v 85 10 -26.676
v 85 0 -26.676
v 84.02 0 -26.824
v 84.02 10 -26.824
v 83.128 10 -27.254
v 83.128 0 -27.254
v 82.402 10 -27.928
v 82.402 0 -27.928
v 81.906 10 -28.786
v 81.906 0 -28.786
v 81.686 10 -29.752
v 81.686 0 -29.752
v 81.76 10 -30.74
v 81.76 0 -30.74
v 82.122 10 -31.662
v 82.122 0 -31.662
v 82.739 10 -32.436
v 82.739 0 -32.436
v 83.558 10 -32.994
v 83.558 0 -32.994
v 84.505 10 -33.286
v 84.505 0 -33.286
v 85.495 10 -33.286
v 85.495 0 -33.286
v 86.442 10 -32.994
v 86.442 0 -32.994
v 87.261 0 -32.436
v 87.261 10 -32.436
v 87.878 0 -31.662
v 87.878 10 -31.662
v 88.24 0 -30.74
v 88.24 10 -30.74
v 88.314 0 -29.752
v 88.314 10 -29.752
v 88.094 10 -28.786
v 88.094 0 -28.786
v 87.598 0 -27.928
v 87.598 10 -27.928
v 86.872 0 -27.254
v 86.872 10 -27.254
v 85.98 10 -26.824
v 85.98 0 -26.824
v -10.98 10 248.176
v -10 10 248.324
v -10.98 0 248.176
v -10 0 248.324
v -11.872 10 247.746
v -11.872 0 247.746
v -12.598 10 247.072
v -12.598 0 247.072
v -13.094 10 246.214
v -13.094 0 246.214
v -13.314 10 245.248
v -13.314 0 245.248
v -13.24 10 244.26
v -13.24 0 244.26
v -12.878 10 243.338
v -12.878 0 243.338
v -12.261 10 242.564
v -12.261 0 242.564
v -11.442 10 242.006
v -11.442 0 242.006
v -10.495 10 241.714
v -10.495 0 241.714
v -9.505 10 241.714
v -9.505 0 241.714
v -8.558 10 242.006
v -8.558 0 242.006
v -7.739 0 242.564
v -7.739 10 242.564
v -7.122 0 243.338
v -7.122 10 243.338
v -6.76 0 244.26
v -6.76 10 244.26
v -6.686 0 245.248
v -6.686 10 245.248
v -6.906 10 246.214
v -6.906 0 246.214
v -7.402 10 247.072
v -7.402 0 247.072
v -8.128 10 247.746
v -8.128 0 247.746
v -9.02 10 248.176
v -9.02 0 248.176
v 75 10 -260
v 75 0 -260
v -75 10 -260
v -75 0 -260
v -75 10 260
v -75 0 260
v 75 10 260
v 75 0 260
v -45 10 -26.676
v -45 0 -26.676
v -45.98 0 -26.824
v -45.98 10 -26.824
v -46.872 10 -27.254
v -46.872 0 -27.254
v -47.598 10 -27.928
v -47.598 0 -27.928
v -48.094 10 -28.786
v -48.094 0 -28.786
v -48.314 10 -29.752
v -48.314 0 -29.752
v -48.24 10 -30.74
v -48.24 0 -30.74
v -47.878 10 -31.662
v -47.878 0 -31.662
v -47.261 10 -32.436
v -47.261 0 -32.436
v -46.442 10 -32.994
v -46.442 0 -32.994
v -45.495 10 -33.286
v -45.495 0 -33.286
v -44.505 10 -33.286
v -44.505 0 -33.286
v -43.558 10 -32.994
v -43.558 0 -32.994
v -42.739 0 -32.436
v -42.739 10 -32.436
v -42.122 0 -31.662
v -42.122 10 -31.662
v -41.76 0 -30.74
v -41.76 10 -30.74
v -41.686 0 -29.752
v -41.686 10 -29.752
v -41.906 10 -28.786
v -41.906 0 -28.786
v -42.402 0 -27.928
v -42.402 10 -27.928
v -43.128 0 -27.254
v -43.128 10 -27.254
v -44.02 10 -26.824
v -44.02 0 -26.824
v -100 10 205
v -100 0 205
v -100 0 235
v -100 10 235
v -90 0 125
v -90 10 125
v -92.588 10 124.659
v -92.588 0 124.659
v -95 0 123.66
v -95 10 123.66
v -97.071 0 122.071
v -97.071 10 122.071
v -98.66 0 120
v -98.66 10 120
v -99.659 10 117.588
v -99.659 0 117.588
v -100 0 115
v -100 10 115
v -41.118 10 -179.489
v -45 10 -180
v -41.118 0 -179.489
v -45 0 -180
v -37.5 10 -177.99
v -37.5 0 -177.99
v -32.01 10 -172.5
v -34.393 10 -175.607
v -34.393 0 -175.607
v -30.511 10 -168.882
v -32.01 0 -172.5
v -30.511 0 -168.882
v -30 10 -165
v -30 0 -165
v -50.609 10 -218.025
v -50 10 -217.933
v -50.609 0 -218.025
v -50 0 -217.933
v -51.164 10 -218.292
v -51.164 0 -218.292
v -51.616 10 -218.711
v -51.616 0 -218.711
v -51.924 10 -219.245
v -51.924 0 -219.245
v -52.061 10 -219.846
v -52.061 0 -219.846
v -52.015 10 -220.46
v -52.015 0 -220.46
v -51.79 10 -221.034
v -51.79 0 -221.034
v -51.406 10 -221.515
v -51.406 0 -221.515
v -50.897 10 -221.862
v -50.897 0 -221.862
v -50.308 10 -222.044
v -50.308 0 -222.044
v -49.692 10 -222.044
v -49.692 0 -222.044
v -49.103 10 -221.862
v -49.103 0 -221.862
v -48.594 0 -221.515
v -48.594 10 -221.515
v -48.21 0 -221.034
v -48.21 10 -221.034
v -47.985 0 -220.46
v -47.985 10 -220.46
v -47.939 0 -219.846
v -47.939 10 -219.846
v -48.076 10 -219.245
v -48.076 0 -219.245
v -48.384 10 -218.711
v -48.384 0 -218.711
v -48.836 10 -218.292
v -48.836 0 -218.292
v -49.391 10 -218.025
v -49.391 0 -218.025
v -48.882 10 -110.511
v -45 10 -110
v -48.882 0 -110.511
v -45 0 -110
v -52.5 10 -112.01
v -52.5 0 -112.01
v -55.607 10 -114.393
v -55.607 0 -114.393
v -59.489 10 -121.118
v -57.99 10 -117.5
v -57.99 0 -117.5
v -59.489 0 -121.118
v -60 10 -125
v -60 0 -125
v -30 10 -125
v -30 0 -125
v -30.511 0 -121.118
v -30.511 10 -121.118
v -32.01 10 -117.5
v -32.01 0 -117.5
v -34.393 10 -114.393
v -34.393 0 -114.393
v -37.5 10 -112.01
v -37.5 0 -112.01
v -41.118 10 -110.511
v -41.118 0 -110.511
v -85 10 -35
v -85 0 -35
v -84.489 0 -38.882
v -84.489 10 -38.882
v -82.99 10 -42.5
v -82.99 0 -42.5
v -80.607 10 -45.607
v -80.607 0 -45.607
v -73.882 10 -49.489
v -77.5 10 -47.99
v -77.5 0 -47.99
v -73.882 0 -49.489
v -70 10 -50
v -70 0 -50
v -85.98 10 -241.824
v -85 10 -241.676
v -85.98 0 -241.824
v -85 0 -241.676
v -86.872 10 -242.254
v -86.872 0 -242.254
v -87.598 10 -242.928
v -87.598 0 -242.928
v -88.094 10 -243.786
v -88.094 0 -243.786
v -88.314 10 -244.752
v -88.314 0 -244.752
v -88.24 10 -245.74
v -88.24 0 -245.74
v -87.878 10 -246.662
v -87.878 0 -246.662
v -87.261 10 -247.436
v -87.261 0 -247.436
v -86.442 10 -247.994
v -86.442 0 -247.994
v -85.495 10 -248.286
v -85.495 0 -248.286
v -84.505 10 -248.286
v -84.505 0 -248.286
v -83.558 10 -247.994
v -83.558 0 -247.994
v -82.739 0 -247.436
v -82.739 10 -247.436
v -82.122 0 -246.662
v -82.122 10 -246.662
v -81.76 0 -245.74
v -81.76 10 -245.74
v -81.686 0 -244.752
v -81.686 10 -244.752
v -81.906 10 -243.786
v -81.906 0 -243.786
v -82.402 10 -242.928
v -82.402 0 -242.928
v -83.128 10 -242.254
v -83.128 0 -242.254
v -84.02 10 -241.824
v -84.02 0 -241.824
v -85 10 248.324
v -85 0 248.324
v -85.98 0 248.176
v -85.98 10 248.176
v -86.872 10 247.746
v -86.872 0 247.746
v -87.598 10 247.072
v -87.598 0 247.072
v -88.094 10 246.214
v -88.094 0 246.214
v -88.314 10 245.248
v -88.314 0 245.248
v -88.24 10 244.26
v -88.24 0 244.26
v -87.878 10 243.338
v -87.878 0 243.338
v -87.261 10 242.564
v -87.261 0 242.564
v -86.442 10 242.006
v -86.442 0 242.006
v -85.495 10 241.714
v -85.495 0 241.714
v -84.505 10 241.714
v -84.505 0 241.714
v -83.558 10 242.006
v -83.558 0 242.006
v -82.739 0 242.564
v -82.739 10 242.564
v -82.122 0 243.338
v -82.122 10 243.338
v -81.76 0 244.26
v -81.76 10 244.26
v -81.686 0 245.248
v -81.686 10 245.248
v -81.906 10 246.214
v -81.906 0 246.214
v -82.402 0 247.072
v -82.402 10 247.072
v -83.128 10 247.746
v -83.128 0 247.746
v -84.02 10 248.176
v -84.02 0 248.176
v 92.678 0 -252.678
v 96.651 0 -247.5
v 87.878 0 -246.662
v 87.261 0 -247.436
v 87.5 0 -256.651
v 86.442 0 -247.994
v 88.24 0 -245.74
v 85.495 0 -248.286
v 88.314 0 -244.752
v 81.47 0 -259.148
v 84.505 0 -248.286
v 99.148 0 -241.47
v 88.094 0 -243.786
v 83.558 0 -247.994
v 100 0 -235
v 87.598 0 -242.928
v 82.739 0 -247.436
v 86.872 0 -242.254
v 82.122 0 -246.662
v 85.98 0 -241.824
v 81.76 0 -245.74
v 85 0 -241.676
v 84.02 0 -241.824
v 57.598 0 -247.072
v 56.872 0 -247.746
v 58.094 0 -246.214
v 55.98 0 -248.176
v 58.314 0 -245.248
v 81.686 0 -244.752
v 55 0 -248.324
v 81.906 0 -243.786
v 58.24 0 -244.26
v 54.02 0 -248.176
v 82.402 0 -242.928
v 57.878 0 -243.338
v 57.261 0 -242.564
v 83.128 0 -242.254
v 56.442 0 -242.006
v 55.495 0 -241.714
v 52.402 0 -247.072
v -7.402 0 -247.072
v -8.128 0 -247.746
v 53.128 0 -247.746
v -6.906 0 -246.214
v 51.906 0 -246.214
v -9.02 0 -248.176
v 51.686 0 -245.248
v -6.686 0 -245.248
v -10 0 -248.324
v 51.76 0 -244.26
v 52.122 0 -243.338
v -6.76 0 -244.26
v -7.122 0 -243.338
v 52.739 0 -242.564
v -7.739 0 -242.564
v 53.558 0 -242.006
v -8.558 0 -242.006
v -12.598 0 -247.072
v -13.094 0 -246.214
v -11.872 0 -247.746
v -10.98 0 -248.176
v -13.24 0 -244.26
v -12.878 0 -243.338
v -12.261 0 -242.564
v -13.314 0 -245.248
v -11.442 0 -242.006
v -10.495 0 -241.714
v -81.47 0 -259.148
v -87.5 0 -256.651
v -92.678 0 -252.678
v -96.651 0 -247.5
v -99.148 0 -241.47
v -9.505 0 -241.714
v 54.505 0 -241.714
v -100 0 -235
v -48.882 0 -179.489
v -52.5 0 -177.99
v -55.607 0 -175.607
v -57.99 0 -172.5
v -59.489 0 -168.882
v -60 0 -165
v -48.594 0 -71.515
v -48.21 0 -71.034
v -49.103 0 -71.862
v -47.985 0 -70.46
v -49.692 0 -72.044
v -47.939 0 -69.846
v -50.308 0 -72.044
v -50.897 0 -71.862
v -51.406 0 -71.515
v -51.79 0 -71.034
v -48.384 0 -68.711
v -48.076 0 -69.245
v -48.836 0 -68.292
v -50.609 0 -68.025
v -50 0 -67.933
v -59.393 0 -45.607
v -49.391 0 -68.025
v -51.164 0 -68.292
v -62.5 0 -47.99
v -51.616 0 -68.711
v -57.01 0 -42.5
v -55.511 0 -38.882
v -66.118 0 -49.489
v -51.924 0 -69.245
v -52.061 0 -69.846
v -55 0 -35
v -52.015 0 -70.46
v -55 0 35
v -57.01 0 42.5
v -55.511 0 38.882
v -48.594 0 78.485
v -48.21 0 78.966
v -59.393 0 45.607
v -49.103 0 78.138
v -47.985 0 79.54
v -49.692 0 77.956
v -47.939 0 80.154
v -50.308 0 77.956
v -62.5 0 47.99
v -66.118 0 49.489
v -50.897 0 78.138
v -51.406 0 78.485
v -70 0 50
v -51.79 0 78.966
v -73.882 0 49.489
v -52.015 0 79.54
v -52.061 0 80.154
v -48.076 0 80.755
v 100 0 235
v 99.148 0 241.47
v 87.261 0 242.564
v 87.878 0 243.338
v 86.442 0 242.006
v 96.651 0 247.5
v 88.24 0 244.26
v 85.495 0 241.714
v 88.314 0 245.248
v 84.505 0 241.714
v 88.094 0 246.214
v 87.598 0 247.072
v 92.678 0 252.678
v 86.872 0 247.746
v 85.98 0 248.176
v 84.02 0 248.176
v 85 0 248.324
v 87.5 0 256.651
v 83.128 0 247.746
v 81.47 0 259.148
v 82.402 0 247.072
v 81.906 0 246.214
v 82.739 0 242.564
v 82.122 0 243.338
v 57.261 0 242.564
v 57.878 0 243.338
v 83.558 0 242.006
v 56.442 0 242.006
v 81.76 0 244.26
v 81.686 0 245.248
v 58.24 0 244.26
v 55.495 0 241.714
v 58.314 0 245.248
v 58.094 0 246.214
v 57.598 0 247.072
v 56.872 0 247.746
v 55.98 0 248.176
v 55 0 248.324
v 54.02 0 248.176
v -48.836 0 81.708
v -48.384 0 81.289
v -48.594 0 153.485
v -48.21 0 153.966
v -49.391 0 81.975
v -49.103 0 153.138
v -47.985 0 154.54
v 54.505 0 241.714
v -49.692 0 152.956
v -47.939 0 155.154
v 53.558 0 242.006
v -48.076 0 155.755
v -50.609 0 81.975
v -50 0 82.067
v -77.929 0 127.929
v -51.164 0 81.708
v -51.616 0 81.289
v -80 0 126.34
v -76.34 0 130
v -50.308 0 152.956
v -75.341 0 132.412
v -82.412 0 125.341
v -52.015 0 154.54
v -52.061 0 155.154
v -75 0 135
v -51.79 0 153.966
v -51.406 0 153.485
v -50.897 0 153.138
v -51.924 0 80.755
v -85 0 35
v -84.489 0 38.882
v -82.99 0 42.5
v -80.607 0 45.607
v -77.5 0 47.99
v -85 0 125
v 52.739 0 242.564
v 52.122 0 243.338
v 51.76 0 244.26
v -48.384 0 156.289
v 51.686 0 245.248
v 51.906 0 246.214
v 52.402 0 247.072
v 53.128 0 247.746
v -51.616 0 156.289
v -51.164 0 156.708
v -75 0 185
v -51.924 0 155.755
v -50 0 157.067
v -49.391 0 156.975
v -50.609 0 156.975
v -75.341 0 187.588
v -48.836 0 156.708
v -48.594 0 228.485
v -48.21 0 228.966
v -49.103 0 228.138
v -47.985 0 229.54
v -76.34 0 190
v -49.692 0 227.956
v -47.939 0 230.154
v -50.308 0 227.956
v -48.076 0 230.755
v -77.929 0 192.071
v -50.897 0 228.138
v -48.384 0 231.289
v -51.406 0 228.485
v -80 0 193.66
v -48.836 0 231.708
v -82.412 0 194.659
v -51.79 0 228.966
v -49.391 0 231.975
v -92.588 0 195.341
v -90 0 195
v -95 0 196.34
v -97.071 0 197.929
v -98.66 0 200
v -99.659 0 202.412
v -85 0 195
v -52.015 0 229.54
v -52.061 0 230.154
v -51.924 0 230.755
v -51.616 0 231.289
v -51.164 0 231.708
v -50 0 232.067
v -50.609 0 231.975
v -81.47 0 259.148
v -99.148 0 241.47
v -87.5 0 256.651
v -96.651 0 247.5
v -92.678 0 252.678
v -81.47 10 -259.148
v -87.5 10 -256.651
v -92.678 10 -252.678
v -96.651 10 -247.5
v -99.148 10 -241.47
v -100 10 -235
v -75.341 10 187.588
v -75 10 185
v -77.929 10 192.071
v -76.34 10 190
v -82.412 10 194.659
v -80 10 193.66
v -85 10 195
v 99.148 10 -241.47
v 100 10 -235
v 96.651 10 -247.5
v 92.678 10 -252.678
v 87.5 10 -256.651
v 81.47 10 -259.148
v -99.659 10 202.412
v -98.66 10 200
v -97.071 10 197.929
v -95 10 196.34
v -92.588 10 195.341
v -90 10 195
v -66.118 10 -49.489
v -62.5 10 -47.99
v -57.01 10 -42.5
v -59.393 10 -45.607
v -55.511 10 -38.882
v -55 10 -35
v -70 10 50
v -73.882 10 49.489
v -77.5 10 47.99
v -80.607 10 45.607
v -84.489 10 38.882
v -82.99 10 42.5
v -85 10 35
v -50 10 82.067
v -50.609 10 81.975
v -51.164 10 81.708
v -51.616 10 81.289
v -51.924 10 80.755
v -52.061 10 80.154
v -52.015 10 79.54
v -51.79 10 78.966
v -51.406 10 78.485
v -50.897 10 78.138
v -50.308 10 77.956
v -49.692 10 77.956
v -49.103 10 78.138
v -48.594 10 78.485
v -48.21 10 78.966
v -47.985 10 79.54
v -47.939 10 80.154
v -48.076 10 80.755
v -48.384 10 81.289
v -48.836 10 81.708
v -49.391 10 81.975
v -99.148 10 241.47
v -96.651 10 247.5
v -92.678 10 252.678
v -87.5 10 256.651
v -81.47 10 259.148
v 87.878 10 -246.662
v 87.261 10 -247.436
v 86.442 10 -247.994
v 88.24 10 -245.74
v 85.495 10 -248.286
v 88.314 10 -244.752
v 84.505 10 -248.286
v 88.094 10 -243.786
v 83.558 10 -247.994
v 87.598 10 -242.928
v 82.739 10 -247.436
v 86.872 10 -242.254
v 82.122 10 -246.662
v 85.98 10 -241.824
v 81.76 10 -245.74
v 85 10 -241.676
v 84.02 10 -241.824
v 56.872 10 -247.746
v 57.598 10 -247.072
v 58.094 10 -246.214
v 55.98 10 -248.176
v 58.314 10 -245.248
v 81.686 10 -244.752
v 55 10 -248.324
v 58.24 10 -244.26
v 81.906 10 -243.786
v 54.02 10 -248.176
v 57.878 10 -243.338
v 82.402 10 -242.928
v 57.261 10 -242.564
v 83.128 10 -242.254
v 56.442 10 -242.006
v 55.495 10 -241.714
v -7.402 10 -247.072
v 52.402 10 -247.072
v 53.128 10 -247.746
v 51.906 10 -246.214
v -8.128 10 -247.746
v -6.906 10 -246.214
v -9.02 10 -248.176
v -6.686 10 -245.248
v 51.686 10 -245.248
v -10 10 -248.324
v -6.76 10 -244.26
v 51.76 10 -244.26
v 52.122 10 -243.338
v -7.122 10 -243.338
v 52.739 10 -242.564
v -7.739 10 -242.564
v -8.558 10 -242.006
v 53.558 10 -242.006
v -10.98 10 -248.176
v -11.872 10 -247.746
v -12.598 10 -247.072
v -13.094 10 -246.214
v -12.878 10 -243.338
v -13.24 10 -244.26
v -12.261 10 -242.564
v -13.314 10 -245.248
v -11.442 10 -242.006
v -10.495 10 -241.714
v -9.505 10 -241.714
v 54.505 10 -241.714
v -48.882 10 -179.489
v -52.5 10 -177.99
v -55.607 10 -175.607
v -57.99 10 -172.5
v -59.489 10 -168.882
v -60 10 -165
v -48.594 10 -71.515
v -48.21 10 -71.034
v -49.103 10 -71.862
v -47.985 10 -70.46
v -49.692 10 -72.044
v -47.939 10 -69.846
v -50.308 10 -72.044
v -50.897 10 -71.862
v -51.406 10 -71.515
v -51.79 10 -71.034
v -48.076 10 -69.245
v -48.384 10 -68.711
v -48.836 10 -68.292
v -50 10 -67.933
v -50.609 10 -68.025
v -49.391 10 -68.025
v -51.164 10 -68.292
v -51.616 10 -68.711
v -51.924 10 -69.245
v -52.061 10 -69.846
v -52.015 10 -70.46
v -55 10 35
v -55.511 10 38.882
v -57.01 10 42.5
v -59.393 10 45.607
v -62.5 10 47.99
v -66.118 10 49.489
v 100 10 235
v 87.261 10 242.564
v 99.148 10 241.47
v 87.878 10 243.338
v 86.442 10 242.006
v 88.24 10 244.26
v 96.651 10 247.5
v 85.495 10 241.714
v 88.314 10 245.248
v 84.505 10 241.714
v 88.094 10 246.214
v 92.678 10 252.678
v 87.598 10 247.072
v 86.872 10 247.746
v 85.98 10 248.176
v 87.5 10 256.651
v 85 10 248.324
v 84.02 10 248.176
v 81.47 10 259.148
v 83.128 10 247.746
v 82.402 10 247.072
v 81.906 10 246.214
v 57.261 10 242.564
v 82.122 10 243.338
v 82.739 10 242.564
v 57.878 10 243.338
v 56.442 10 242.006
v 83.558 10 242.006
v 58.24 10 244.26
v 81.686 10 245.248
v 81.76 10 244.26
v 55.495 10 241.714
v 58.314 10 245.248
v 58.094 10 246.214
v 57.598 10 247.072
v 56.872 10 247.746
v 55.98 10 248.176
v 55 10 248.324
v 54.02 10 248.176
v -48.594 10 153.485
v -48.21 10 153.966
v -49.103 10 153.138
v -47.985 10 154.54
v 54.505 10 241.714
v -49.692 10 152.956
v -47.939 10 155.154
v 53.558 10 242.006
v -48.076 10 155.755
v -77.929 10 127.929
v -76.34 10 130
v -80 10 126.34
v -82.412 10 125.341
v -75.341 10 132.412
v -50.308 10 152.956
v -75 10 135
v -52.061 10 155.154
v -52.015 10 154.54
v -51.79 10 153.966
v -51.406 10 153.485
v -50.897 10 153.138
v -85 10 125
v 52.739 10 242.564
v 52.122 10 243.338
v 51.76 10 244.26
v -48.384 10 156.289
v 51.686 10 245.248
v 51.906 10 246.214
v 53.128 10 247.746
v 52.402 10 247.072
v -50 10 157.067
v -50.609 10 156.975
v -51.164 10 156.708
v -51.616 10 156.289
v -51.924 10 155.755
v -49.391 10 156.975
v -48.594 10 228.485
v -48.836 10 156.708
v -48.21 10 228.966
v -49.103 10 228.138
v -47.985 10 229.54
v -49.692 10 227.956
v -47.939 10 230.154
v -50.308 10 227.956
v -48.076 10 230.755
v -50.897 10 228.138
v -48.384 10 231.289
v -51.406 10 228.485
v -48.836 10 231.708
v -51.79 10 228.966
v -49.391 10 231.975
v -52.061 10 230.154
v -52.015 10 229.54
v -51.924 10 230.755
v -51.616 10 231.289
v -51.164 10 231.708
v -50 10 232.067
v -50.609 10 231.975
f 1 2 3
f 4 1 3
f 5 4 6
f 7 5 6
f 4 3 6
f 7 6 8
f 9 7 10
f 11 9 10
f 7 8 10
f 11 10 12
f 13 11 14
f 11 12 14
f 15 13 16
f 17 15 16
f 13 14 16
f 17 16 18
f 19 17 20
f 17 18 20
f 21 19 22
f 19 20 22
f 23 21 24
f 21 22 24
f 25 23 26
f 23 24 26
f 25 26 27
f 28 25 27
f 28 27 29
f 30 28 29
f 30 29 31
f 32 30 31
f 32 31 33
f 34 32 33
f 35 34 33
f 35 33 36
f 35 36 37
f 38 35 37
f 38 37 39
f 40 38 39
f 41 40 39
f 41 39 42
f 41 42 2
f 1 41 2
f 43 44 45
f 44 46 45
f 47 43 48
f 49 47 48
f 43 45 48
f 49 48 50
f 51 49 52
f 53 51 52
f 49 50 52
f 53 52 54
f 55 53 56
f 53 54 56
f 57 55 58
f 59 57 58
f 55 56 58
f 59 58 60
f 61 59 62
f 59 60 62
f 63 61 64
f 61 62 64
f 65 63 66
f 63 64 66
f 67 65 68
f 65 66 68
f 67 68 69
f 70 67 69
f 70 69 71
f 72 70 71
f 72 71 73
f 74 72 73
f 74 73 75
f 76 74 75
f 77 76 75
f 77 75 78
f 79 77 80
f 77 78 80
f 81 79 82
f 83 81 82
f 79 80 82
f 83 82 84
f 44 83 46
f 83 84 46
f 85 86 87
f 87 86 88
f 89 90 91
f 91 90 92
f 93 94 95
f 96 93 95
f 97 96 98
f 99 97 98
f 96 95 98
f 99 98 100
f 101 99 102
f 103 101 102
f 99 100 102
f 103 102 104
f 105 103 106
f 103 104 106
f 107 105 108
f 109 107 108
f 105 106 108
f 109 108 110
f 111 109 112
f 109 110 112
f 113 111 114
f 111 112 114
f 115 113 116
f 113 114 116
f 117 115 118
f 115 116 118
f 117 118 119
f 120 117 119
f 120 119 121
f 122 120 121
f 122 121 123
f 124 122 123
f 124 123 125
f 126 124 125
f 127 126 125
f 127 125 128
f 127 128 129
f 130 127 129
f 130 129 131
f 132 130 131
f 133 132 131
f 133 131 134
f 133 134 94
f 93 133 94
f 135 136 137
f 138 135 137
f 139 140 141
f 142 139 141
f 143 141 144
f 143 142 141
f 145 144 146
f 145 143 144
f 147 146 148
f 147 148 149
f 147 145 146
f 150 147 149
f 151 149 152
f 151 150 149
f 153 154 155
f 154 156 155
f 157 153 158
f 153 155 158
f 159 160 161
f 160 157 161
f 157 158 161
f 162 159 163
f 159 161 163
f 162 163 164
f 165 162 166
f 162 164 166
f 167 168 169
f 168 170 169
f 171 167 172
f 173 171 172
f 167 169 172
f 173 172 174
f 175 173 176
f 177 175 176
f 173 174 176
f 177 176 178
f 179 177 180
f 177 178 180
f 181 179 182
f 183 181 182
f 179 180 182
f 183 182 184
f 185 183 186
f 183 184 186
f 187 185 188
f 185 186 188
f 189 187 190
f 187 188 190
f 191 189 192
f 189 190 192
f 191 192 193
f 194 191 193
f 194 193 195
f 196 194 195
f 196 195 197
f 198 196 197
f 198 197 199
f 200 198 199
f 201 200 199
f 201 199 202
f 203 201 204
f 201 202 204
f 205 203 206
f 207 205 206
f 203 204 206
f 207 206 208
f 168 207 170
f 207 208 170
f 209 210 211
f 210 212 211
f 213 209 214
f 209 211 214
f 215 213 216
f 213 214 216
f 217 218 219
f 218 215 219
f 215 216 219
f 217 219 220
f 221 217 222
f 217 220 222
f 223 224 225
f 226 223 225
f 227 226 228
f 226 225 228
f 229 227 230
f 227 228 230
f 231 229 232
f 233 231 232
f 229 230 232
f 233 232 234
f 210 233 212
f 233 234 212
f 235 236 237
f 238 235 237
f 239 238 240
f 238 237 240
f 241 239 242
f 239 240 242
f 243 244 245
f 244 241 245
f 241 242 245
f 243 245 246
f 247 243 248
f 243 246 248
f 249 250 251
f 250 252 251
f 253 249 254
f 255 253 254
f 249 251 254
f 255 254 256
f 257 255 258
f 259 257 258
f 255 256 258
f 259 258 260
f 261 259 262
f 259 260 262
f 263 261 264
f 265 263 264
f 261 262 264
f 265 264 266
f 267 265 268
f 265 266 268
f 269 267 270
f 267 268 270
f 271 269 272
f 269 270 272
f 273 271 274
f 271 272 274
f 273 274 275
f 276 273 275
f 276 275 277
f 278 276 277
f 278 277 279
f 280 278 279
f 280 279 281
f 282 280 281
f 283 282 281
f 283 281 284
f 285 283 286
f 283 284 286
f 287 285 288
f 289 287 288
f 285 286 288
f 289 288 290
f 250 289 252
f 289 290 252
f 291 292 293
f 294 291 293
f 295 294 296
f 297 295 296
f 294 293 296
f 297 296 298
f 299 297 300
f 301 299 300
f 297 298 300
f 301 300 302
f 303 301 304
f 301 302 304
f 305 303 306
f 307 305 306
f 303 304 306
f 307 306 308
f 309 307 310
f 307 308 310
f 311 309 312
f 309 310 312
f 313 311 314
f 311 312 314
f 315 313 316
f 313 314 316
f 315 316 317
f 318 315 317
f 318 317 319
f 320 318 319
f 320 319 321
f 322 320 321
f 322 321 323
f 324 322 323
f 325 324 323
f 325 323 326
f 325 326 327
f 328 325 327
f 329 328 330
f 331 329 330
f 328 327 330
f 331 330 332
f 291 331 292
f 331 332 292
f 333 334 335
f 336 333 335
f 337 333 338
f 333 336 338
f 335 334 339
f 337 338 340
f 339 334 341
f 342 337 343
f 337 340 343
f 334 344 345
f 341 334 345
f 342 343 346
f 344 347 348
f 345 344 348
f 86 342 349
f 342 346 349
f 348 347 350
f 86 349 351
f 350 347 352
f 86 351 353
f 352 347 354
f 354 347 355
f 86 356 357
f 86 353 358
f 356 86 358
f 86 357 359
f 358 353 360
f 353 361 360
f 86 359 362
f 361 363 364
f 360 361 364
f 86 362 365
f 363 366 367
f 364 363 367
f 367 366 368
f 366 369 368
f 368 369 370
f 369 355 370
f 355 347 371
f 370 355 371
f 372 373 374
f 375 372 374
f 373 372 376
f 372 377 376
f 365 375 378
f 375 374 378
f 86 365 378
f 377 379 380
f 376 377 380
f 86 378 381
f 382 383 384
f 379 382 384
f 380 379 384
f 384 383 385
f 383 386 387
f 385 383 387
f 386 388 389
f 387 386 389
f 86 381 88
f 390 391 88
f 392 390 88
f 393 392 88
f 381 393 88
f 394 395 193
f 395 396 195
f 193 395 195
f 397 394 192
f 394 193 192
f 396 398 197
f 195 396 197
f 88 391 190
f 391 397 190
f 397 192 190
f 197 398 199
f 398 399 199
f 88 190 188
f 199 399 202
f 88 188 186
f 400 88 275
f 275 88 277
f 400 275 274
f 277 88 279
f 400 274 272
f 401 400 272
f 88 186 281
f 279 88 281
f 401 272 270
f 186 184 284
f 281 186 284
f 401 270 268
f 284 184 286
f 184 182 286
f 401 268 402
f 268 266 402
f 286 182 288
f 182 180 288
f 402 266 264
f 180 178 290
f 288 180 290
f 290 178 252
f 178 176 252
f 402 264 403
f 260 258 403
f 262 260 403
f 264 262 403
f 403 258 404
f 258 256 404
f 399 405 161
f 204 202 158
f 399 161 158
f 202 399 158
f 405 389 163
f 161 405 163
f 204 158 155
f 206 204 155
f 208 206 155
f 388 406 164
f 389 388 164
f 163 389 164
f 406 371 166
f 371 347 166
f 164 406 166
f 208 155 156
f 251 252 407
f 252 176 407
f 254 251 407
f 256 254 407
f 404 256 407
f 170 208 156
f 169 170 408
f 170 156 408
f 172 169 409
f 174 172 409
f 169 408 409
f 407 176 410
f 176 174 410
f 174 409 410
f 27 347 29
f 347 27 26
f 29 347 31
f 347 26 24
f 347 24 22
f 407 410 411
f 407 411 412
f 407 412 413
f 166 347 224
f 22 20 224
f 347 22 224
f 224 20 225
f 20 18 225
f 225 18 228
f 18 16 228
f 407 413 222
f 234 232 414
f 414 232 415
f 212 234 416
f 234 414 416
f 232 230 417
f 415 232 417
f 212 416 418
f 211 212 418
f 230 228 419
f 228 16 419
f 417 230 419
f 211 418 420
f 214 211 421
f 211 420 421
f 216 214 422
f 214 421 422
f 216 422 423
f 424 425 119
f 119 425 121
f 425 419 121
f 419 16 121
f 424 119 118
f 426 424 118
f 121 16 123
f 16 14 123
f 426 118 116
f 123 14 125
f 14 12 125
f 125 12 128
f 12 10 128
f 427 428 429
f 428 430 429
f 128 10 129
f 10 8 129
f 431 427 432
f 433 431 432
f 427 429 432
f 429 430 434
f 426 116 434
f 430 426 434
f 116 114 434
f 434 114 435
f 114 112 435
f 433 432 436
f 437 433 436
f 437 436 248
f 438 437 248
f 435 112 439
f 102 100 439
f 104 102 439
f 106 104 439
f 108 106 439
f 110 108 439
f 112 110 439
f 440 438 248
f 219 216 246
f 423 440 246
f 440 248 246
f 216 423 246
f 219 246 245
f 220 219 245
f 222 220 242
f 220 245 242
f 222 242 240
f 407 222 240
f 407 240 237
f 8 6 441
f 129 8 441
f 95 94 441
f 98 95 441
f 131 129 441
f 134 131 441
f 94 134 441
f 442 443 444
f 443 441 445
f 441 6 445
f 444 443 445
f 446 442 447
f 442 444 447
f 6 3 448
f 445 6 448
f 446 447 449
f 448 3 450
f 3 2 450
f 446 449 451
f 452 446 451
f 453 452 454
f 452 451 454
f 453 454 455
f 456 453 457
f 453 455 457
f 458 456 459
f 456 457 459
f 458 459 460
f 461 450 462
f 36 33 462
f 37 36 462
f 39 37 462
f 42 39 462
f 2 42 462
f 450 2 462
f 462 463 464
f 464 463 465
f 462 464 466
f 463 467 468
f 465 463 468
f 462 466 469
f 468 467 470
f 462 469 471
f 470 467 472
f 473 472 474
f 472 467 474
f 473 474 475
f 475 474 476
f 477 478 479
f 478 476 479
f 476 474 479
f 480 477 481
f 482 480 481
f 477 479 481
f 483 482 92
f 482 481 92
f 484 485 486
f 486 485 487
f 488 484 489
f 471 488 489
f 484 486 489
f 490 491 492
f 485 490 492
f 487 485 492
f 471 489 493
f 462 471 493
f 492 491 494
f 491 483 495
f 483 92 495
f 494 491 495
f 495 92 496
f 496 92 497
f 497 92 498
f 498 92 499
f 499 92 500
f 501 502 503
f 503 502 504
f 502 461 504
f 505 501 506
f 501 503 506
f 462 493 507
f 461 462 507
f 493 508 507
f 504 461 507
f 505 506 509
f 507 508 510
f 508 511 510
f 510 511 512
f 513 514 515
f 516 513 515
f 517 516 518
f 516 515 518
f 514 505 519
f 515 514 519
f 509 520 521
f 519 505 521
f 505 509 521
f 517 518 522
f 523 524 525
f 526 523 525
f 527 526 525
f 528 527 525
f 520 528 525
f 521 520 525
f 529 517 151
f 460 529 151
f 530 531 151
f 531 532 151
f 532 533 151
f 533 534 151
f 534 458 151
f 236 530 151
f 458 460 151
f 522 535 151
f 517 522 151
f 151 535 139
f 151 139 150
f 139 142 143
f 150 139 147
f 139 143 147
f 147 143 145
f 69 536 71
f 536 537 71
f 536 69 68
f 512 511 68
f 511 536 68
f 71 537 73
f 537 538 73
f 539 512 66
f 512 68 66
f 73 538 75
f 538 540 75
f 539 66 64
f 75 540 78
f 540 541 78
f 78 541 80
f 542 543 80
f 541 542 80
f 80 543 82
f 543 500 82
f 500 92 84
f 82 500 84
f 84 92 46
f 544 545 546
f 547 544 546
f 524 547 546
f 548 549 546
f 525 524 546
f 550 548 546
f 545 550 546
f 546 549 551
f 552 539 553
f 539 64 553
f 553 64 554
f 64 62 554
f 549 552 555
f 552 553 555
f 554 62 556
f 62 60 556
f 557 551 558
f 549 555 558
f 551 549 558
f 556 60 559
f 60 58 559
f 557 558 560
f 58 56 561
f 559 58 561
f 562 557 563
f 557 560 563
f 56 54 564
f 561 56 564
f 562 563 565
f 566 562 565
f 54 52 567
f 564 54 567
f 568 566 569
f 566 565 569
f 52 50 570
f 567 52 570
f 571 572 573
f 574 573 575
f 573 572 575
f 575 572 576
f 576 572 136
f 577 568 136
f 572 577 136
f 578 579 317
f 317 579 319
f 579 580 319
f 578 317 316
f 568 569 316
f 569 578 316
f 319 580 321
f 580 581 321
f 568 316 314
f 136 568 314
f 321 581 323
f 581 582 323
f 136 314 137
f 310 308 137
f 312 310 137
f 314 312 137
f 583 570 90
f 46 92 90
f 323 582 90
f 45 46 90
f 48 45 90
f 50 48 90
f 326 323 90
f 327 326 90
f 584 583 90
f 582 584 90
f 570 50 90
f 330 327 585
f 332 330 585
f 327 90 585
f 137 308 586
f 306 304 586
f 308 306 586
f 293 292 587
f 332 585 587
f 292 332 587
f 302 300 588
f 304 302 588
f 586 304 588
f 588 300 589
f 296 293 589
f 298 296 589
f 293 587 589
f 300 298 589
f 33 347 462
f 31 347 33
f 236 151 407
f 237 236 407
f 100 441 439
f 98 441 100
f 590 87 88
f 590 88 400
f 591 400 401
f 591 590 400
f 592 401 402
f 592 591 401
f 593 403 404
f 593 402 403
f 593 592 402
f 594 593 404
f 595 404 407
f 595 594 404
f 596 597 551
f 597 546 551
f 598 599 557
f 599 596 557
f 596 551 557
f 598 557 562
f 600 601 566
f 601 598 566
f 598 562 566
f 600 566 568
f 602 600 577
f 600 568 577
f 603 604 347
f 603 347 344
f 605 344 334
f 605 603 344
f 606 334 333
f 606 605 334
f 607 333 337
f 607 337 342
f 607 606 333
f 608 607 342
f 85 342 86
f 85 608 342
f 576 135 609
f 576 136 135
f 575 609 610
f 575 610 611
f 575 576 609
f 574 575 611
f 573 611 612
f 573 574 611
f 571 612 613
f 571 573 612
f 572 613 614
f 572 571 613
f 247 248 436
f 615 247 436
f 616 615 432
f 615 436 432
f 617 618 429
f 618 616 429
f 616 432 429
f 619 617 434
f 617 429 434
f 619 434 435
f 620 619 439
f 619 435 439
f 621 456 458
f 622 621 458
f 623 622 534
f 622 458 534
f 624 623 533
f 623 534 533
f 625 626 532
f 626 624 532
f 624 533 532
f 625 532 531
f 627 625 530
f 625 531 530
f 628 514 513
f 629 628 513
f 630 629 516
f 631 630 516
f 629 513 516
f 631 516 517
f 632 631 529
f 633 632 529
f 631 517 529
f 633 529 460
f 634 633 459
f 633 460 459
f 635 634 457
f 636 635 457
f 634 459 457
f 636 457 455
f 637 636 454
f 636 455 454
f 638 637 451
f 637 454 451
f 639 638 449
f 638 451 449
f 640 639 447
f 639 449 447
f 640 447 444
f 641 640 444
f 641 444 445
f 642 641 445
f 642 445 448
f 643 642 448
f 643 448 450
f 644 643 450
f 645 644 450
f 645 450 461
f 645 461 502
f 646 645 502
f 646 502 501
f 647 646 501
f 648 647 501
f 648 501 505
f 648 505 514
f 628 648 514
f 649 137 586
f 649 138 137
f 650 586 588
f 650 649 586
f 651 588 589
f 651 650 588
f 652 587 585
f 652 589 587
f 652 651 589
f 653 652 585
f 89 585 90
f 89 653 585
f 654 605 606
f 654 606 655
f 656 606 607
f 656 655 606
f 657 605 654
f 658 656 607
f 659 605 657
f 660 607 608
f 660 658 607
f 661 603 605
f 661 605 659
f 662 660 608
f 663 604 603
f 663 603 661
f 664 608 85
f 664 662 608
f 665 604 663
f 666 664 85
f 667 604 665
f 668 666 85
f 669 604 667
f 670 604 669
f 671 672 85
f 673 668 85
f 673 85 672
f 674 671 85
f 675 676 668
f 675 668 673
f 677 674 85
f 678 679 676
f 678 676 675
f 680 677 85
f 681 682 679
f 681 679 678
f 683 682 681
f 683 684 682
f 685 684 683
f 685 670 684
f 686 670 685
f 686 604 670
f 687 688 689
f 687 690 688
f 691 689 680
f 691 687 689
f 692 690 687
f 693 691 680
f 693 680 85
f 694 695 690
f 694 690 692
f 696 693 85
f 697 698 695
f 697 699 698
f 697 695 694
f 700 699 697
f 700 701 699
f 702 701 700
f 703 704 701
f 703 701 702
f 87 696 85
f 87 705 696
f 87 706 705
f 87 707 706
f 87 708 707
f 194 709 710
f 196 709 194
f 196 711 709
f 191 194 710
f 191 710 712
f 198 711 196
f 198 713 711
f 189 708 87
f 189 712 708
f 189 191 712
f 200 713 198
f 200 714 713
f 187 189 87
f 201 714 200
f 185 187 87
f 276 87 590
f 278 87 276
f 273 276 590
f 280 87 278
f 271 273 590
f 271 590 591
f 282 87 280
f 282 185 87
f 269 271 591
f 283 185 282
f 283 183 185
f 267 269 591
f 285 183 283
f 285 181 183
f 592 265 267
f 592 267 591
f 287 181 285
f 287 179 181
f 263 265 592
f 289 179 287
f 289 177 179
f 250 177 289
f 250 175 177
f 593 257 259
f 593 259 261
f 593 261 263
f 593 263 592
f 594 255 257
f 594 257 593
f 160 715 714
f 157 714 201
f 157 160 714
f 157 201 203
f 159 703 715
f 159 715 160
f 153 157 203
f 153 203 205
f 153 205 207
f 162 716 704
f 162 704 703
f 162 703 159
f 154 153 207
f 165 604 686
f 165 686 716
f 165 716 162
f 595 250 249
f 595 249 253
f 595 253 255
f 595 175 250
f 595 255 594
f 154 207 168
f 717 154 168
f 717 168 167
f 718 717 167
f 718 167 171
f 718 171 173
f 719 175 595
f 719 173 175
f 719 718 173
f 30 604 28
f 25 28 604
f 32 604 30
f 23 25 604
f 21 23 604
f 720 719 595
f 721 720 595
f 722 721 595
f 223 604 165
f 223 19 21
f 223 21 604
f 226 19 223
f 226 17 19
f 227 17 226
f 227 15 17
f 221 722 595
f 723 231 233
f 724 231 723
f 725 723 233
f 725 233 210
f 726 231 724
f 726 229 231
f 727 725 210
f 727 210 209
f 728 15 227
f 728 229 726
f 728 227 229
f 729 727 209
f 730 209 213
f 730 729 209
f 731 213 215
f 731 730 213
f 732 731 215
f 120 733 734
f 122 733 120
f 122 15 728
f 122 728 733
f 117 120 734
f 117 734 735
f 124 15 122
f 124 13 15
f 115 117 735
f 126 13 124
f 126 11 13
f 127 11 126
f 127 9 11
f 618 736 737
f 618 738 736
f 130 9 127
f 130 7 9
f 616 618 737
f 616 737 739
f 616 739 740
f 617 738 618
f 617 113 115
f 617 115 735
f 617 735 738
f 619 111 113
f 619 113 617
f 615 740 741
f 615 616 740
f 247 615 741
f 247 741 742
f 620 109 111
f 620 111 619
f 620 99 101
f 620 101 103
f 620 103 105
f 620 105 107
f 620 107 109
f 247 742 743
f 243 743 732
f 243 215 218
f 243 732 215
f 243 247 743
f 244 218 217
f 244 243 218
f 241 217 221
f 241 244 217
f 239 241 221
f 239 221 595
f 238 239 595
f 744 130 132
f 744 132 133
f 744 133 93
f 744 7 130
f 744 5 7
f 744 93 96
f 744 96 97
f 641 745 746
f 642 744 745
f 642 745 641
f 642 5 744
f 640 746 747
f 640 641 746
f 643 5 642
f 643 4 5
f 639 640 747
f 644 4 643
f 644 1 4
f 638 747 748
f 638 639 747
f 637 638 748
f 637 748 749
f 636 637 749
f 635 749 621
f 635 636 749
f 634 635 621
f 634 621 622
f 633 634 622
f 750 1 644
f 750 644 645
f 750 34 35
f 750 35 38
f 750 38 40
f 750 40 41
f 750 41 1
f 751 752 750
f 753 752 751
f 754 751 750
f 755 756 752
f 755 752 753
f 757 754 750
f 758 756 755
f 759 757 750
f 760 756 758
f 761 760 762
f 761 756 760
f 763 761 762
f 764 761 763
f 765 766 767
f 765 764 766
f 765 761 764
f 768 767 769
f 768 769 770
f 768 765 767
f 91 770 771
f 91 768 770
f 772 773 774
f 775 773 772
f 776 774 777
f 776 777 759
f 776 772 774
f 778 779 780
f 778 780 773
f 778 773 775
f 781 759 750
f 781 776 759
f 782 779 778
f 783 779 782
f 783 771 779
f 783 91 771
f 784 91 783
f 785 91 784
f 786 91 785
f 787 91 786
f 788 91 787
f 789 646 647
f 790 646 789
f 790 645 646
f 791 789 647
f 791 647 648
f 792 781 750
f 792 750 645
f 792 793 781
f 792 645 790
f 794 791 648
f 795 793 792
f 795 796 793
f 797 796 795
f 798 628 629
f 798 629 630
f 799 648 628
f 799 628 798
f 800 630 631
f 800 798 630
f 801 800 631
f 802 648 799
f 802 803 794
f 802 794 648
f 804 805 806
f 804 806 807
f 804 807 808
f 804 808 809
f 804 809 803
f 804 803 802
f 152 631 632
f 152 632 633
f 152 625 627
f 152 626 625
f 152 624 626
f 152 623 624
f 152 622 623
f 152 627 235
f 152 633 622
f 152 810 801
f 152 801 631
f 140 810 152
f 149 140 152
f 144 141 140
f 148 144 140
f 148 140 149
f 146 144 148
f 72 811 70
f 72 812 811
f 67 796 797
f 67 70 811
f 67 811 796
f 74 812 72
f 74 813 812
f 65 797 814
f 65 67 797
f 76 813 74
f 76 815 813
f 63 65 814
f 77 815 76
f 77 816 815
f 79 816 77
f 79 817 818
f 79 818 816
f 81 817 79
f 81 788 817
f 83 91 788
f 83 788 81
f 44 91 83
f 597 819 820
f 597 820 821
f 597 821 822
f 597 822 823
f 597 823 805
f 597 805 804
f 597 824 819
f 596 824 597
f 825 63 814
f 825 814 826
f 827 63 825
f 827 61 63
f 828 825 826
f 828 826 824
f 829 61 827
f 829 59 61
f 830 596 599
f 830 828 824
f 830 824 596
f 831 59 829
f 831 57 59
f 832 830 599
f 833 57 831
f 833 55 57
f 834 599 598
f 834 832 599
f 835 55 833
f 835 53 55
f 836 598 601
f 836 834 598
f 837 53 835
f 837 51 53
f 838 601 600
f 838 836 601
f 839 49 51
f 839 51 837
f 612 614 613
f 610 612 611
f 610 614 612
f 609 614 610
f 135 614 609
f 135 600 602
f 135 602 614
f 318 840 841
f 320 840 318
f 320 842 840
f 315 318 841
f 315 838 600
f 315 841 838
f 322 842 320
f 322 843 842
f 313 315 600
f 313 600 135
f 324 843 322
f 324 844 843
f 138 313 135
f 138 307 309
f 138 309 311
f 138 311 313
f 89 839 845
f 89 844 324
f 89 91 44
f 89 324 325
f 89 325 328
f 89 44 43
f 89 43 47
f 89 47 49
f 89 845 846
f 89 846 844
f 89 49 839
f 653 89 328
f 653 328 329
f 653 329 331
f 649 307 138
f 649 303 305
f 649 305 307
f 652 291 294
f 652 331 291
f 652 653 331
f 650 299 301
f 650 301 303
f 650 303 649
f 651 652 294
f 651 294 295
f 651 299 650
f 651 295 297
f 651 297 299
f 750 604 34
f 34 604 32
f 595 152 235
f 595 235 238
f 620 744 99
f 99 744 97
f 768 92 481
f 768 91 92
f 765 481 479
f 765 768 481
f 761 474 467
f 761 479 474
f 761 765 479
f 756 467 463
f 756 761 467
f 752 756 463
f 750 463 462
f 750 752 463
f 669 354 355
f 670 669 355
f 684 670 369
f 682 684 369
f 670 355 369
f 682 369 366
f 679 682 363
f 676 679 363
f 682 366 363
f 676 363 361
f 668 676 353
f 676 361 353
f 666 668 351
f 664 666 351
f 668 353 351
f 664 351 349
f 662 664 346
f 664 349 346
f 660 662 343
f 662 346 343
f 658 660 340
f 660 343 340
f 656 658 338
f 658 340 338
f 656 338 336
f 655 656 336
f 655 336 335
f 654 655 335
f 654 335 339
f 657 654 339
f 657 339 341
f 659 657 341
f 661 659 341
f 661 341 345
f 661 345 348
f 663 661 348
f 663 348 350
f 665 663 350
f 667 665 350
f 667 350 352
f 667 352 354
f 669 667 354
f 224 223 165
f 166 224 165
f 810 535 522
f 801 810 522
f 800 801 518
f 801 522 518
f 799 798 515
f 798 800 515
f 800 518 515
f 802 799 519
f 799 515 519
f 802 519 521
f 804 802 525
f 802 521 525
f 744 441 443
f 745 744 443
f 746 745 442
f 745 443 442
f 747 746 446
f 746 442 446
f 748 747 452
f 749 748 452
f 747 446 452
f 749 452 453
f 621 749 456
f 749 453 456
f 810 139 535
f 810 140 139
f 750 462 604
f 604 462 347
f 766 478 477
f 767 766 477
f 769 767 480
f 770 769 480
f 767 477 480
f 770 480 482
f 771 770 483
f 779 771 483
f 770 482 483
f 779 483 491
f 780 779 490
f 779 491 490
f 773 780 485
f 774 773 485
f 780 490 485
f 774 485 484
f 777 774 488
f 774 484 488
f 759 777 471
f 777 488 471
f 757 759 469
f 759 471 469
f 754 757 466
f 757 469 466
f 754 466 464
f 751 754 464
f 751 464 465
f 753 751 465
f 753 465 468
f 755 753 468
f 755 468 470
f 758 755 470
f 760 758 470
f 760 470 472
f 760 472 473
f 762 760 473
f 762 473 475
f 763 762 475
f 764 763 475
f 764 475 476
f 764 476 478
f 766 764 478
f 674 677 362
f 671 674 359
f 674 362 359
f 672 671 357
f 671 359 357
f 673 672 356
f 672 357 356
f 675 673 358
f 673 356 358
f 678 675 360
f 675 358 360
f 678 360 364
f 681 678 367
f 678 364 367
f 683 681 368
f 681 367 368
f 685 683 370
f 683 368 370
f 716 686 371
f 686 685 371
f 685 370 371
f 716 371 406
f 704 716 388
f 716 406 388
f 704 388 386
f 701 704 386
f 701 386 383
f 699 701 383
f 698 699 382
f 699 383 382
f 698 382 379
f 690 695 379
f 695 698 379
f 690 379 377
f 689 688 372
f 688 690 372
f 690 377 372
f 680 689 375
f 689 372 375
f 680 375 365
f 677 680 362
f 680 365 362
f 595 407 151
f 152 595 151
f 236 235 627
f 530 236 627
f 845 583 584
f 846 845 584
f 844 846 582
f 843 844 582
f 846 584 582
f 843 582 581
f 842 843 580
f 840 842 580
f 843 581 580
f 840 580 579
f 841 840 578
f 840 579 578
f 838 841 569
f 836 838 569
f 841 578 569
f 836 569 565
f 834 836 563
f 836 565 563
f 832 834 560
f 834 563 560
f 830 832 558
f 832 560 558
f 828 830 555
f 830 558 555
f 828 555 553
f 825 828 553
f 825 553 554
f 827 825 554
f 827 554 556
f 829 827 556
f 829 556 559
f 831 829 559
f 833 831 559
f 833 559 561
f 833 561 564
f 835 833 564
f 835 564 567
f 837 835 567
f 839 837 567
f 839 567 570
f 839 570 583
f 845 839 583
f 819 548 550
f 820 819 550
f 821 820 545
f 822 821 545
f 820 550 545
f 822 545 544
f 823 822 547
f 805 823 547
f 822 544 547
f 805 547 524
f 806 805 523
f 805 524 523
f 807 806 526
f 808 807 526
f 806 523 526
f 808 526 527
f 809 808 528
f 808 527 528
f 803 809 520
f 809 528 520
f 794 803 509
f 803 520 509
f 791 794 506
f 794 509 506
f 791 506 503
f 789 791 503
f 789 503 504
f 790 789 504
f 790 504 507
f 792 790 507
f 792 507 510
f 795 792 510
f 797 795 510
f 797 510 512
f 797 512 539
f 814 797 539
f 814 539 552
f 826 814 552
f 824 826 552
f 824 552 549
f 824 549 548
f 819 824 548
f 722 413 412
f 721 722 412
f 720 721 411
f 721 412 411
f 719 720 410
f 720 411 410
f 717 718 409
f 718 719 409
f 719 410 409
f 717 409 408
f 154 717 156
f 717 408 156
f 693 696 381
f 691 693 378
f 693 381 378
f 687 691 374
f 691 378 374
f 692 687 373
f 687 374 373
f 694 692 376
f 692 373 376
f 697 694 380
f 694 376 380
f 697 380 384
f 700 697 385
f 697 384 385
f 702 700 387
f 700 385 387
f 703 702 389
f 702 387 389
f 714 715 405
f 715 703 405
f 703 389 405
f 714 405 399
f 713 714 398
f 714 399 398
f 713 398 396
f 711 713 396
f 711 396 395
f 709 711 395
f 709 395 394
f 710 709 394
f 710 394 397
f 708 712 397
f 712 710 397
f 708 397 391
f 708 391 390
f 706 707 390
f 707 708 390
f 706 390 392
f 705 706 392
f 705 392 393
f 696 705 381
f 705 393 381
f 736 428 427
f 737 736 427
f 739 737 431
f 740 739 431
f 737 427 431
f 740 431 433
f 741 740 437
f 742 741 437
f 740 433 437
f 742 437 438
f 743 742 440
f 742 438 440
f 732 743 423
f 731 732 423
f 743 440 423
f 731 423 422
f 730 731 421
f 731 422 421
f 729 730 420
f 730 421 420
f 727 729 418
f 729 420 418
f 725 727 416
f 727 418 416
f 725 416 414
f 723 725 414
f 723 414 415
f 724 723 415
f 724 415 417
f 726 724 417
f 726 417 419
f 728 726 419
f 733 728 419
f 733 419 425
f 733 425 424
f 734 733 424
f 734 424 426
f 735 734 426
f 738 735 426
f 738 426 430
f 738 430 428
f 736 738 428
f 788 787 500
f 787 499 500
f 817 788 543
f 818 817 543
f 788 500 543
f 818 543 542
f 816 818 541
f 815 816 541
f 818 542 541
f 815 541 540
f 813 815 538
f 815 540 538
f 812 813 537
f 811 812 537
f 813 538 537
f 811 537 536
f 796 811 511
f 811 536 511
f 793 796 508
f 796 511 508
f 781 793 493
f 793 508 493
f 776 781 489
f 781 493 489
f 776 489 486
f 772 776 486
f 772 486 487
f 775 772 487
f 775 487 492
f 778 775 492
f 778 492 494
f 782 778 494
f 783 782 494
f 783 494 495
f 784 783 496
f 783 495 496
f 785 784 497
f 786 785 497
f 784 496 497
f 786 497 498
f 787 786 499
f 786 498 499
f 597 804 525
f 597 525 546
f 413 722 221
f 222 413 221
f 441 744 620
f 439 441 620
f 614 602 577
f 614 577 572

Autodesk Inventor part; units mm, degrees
ref_plane "YZ Plane" through (0, 0, 0) normal (1, 0, 0) x (0, 1, 0)
ref_plane "XZ Plane" through (0, 0, 0) normal (0, 1, 0) x (-1, 0, 0)
ref_plane "XY Plane" through (0, 0, 0) normal (0, 0, 1) x (1, 0, 0)
sketch "Sketch1" plane through (0, 0, 0) normal (0, 1, 0) x (-1, 0, 0)
  line L0 (-100, -260) -> (100, -260)
  line L1 (100, -260) -> (100, 260)
  line L2 (100, 260) -> (-100, 260)
  line L3 (-100, 260) -> (-100, -260)
  line L4 (-100, -260) -> (100, 260) construction
  line L5 (100, -260) -> (-100, 260) construction
  point P0 (0, 0)
  dimension "d0" = 200
  dimension "d1" = 520
extrude "Extrusion1" add sketch "Sketch1" along normal blind 10
fillet "Fillet1" radius 25 4 edges at (-100, 5, -260) (-100, 5, 260) (100, 5, 260) (100, 5, -260)
sketch "Sketch2" plane through (0, 10, 0) normal (0, 1, 0) x (1, 0, 0)
  line L0 (100, -235) -> (100, 235) projected
  line L1 (-75, -260) -> (75, -260) projected
  point P0 (0, 0)
  point P1 (85, -245)
  dimension "d5" = 15
  dimension "d6" = 15
hole "Hole1" at (85, 10, 245) direction (0, -1, 0) diameter 6.647 end through all thread size "M8x1.25" class "6H" standard "ISO Metric profile"
pattern_linear "Rectangular Pattern1" count 2 spacing 170 along (-1, 0, 0) count 2 spacing 490 along (0, 0, -1) of "Hole1"
sketch "Sketch3" plane through (0, 10, 0) normal (0, 1, 0) x (1, 0, 0)
  line L0 (-75, -260) -> (75, -260) projected
  line L1 (-100, 235) -> (-100, -235) projected
  point P0 (0, 0)
  point P1 (-10, -245)
  point P2 (55, -245)
  dimension "d20" = 15
  dimension "d21" = 90
  dimension "d22" = 65
  dimension "d23" = 15
hole "Hole2" at (-10, 10, 245) at (55, 10, 245) direction (0, -1, 0) diameter 6.647 end through all thread size "M8x1.25" class "6H" standard "ISO Metric profile"
mirror "Mirror1" about plane through (0, 0, 0) normal (0, 0, 1) of "Hole2"
sketch "Sketch4" plane through (0, 10, 0) normal (0, 1, 0) x (1, 0, 0)
  line L0 (75, 260) -> (-75, 260) projected
  line L1 (100, -235) -> (100, 235) projected
  point P0 (0, 0)
  point P1 (-45, 30)
  point P2 (85, 30)
  dimension "d31" = 230
  dimension "d32" = 145
  dimension "d33" = 230
  dimension "d34" = 15
hole "Hole3" at (-45, 10, -30) at (85, 10, -30) direction (0, -1, 0) diameter 6.647 end through all thread size "M8x1.25" class "6H" standard "ISO Metric profile"
sketch "Sketch8" plane through (0, 10, 0) normal (0, 1, 0) x (1, 0, 0)
  line L0 (-100, 235) -> (-100, -235) projected
  line L1 (-100, -125) -> (-75, -125)
  line L2 (-75, -125) -> (-75, -195)
  line L3 (-75, -195) -> (-100, -195)
  line L4 (-100, -195) -> (-100, -125)
  line L5 (-75, -260) -> (75, -260) projected
  point P0 (0, 0)
  dimension "d72" = 25
  dimension "d73" = 70
  dimension "d74" = 65
extrude "Extrusion2" cut sketch "Sketch8" against normal blind 10
fillet "Fillet2" radius 10 4 edges at (-100, 5, 125) (-75, 5, 125) (-100, 5, 195) (-75, 5, 195)
sketch "Sketch9" plane through (0, 10, 0) normal (0, 1, 0) x (1, 0, 0)
  line L0 (-55, 50) -> (-85, 50)
  line L1 (-85, 50) -> (-85, -50)
  line L2 (-85, -50) -> (-55, -50)
  line L3 (-55, -50) -> (-55, 50)
  line L4 (-100, 235) -> (-100, -115) projected
  line L5 (75, 260) -> (-75, 260) projected
  point P0 (0, 0)
  dimension "d78" = 30
  dimension "d79" = 100
  dimension "d80" = 15
  dimension "d81" = 210
extrude "Extrusion3" cut sketch "Sketch9" against normal blind 10
fillet "Fillet3" radius 15 4 edges at (-55, 5, -50) (-55, 5, 50) (-85, 5, 50) (-85, 5, -50)
sketch "Sketch10" plane through (0, 10, 0) normal (0, 1, 0) x (1, 0, 0)
  line L0 (-30, 180) -> (-60, 180)
  line L1 (-60, 180) -> (-60, 110)
  line L2 (-60, 110) -> (-30, 110)
  line L3 (-30, 110) -> (-30, 180)
  line L4 (-100, 235) -> (-100, -115) projected
  line L5 (75, 260) -> (-75, 260) projected
  point P0 (0, 0)
  dimension "d85" = 30
  dimension "d86" = 70
  dimension "d87" = 40
  dimension "d88" = 80
extrude "Extrusion4" cut sketch "Sketch10" against normal blind 10
fillet "Fillet4" radius 15 4 edges at (-60, 5, -110) (-60, 5, -180) (-30, 5, -180) (-30, 5, -110)
sketch "Sketch11" plane through (0, 10, 0) normal (0, 1, 0) x (1, 0, 0)
  line L0 (-100, 235) -> (-100, -115) projected
  line L1 (-100, -205) -> (-100, -235) projected
  line L2 (75, 260) -> (-75, 260) projected
  line L3 (-75, -260) -> (75, -260) projected
  point P0 (0, 0)
  point P1 (-50, 220)
  point P2 (-50, 70)
  point P3 (-50, -80)
  point P4 (-50, -155)
  point P5 (-50, -230)
  dimension "d92" = 50
  dimension "d93" = 50
  dimension "d94" = 50
  dimension "d95" = 50
  dimension "d96" = 50
  dimension "d97" = 40
  dimension "d98" = 190
  dimension "d99" = 180
  dimension "d100" = 105
  dimension "d101" = 30
hole "Hole7" at (-50, 10, -220) at (-50, 10, -70) at (-50, 10, 80) at (-50, 10, 155) at (-50, 10, 230) direction (0, -1, 0) diameter 4.134 end through all thread size "M5x0.8" class "6H" standard "ISO Metric profile"
properties part number "Current_plate" material "Stainless Steel"
